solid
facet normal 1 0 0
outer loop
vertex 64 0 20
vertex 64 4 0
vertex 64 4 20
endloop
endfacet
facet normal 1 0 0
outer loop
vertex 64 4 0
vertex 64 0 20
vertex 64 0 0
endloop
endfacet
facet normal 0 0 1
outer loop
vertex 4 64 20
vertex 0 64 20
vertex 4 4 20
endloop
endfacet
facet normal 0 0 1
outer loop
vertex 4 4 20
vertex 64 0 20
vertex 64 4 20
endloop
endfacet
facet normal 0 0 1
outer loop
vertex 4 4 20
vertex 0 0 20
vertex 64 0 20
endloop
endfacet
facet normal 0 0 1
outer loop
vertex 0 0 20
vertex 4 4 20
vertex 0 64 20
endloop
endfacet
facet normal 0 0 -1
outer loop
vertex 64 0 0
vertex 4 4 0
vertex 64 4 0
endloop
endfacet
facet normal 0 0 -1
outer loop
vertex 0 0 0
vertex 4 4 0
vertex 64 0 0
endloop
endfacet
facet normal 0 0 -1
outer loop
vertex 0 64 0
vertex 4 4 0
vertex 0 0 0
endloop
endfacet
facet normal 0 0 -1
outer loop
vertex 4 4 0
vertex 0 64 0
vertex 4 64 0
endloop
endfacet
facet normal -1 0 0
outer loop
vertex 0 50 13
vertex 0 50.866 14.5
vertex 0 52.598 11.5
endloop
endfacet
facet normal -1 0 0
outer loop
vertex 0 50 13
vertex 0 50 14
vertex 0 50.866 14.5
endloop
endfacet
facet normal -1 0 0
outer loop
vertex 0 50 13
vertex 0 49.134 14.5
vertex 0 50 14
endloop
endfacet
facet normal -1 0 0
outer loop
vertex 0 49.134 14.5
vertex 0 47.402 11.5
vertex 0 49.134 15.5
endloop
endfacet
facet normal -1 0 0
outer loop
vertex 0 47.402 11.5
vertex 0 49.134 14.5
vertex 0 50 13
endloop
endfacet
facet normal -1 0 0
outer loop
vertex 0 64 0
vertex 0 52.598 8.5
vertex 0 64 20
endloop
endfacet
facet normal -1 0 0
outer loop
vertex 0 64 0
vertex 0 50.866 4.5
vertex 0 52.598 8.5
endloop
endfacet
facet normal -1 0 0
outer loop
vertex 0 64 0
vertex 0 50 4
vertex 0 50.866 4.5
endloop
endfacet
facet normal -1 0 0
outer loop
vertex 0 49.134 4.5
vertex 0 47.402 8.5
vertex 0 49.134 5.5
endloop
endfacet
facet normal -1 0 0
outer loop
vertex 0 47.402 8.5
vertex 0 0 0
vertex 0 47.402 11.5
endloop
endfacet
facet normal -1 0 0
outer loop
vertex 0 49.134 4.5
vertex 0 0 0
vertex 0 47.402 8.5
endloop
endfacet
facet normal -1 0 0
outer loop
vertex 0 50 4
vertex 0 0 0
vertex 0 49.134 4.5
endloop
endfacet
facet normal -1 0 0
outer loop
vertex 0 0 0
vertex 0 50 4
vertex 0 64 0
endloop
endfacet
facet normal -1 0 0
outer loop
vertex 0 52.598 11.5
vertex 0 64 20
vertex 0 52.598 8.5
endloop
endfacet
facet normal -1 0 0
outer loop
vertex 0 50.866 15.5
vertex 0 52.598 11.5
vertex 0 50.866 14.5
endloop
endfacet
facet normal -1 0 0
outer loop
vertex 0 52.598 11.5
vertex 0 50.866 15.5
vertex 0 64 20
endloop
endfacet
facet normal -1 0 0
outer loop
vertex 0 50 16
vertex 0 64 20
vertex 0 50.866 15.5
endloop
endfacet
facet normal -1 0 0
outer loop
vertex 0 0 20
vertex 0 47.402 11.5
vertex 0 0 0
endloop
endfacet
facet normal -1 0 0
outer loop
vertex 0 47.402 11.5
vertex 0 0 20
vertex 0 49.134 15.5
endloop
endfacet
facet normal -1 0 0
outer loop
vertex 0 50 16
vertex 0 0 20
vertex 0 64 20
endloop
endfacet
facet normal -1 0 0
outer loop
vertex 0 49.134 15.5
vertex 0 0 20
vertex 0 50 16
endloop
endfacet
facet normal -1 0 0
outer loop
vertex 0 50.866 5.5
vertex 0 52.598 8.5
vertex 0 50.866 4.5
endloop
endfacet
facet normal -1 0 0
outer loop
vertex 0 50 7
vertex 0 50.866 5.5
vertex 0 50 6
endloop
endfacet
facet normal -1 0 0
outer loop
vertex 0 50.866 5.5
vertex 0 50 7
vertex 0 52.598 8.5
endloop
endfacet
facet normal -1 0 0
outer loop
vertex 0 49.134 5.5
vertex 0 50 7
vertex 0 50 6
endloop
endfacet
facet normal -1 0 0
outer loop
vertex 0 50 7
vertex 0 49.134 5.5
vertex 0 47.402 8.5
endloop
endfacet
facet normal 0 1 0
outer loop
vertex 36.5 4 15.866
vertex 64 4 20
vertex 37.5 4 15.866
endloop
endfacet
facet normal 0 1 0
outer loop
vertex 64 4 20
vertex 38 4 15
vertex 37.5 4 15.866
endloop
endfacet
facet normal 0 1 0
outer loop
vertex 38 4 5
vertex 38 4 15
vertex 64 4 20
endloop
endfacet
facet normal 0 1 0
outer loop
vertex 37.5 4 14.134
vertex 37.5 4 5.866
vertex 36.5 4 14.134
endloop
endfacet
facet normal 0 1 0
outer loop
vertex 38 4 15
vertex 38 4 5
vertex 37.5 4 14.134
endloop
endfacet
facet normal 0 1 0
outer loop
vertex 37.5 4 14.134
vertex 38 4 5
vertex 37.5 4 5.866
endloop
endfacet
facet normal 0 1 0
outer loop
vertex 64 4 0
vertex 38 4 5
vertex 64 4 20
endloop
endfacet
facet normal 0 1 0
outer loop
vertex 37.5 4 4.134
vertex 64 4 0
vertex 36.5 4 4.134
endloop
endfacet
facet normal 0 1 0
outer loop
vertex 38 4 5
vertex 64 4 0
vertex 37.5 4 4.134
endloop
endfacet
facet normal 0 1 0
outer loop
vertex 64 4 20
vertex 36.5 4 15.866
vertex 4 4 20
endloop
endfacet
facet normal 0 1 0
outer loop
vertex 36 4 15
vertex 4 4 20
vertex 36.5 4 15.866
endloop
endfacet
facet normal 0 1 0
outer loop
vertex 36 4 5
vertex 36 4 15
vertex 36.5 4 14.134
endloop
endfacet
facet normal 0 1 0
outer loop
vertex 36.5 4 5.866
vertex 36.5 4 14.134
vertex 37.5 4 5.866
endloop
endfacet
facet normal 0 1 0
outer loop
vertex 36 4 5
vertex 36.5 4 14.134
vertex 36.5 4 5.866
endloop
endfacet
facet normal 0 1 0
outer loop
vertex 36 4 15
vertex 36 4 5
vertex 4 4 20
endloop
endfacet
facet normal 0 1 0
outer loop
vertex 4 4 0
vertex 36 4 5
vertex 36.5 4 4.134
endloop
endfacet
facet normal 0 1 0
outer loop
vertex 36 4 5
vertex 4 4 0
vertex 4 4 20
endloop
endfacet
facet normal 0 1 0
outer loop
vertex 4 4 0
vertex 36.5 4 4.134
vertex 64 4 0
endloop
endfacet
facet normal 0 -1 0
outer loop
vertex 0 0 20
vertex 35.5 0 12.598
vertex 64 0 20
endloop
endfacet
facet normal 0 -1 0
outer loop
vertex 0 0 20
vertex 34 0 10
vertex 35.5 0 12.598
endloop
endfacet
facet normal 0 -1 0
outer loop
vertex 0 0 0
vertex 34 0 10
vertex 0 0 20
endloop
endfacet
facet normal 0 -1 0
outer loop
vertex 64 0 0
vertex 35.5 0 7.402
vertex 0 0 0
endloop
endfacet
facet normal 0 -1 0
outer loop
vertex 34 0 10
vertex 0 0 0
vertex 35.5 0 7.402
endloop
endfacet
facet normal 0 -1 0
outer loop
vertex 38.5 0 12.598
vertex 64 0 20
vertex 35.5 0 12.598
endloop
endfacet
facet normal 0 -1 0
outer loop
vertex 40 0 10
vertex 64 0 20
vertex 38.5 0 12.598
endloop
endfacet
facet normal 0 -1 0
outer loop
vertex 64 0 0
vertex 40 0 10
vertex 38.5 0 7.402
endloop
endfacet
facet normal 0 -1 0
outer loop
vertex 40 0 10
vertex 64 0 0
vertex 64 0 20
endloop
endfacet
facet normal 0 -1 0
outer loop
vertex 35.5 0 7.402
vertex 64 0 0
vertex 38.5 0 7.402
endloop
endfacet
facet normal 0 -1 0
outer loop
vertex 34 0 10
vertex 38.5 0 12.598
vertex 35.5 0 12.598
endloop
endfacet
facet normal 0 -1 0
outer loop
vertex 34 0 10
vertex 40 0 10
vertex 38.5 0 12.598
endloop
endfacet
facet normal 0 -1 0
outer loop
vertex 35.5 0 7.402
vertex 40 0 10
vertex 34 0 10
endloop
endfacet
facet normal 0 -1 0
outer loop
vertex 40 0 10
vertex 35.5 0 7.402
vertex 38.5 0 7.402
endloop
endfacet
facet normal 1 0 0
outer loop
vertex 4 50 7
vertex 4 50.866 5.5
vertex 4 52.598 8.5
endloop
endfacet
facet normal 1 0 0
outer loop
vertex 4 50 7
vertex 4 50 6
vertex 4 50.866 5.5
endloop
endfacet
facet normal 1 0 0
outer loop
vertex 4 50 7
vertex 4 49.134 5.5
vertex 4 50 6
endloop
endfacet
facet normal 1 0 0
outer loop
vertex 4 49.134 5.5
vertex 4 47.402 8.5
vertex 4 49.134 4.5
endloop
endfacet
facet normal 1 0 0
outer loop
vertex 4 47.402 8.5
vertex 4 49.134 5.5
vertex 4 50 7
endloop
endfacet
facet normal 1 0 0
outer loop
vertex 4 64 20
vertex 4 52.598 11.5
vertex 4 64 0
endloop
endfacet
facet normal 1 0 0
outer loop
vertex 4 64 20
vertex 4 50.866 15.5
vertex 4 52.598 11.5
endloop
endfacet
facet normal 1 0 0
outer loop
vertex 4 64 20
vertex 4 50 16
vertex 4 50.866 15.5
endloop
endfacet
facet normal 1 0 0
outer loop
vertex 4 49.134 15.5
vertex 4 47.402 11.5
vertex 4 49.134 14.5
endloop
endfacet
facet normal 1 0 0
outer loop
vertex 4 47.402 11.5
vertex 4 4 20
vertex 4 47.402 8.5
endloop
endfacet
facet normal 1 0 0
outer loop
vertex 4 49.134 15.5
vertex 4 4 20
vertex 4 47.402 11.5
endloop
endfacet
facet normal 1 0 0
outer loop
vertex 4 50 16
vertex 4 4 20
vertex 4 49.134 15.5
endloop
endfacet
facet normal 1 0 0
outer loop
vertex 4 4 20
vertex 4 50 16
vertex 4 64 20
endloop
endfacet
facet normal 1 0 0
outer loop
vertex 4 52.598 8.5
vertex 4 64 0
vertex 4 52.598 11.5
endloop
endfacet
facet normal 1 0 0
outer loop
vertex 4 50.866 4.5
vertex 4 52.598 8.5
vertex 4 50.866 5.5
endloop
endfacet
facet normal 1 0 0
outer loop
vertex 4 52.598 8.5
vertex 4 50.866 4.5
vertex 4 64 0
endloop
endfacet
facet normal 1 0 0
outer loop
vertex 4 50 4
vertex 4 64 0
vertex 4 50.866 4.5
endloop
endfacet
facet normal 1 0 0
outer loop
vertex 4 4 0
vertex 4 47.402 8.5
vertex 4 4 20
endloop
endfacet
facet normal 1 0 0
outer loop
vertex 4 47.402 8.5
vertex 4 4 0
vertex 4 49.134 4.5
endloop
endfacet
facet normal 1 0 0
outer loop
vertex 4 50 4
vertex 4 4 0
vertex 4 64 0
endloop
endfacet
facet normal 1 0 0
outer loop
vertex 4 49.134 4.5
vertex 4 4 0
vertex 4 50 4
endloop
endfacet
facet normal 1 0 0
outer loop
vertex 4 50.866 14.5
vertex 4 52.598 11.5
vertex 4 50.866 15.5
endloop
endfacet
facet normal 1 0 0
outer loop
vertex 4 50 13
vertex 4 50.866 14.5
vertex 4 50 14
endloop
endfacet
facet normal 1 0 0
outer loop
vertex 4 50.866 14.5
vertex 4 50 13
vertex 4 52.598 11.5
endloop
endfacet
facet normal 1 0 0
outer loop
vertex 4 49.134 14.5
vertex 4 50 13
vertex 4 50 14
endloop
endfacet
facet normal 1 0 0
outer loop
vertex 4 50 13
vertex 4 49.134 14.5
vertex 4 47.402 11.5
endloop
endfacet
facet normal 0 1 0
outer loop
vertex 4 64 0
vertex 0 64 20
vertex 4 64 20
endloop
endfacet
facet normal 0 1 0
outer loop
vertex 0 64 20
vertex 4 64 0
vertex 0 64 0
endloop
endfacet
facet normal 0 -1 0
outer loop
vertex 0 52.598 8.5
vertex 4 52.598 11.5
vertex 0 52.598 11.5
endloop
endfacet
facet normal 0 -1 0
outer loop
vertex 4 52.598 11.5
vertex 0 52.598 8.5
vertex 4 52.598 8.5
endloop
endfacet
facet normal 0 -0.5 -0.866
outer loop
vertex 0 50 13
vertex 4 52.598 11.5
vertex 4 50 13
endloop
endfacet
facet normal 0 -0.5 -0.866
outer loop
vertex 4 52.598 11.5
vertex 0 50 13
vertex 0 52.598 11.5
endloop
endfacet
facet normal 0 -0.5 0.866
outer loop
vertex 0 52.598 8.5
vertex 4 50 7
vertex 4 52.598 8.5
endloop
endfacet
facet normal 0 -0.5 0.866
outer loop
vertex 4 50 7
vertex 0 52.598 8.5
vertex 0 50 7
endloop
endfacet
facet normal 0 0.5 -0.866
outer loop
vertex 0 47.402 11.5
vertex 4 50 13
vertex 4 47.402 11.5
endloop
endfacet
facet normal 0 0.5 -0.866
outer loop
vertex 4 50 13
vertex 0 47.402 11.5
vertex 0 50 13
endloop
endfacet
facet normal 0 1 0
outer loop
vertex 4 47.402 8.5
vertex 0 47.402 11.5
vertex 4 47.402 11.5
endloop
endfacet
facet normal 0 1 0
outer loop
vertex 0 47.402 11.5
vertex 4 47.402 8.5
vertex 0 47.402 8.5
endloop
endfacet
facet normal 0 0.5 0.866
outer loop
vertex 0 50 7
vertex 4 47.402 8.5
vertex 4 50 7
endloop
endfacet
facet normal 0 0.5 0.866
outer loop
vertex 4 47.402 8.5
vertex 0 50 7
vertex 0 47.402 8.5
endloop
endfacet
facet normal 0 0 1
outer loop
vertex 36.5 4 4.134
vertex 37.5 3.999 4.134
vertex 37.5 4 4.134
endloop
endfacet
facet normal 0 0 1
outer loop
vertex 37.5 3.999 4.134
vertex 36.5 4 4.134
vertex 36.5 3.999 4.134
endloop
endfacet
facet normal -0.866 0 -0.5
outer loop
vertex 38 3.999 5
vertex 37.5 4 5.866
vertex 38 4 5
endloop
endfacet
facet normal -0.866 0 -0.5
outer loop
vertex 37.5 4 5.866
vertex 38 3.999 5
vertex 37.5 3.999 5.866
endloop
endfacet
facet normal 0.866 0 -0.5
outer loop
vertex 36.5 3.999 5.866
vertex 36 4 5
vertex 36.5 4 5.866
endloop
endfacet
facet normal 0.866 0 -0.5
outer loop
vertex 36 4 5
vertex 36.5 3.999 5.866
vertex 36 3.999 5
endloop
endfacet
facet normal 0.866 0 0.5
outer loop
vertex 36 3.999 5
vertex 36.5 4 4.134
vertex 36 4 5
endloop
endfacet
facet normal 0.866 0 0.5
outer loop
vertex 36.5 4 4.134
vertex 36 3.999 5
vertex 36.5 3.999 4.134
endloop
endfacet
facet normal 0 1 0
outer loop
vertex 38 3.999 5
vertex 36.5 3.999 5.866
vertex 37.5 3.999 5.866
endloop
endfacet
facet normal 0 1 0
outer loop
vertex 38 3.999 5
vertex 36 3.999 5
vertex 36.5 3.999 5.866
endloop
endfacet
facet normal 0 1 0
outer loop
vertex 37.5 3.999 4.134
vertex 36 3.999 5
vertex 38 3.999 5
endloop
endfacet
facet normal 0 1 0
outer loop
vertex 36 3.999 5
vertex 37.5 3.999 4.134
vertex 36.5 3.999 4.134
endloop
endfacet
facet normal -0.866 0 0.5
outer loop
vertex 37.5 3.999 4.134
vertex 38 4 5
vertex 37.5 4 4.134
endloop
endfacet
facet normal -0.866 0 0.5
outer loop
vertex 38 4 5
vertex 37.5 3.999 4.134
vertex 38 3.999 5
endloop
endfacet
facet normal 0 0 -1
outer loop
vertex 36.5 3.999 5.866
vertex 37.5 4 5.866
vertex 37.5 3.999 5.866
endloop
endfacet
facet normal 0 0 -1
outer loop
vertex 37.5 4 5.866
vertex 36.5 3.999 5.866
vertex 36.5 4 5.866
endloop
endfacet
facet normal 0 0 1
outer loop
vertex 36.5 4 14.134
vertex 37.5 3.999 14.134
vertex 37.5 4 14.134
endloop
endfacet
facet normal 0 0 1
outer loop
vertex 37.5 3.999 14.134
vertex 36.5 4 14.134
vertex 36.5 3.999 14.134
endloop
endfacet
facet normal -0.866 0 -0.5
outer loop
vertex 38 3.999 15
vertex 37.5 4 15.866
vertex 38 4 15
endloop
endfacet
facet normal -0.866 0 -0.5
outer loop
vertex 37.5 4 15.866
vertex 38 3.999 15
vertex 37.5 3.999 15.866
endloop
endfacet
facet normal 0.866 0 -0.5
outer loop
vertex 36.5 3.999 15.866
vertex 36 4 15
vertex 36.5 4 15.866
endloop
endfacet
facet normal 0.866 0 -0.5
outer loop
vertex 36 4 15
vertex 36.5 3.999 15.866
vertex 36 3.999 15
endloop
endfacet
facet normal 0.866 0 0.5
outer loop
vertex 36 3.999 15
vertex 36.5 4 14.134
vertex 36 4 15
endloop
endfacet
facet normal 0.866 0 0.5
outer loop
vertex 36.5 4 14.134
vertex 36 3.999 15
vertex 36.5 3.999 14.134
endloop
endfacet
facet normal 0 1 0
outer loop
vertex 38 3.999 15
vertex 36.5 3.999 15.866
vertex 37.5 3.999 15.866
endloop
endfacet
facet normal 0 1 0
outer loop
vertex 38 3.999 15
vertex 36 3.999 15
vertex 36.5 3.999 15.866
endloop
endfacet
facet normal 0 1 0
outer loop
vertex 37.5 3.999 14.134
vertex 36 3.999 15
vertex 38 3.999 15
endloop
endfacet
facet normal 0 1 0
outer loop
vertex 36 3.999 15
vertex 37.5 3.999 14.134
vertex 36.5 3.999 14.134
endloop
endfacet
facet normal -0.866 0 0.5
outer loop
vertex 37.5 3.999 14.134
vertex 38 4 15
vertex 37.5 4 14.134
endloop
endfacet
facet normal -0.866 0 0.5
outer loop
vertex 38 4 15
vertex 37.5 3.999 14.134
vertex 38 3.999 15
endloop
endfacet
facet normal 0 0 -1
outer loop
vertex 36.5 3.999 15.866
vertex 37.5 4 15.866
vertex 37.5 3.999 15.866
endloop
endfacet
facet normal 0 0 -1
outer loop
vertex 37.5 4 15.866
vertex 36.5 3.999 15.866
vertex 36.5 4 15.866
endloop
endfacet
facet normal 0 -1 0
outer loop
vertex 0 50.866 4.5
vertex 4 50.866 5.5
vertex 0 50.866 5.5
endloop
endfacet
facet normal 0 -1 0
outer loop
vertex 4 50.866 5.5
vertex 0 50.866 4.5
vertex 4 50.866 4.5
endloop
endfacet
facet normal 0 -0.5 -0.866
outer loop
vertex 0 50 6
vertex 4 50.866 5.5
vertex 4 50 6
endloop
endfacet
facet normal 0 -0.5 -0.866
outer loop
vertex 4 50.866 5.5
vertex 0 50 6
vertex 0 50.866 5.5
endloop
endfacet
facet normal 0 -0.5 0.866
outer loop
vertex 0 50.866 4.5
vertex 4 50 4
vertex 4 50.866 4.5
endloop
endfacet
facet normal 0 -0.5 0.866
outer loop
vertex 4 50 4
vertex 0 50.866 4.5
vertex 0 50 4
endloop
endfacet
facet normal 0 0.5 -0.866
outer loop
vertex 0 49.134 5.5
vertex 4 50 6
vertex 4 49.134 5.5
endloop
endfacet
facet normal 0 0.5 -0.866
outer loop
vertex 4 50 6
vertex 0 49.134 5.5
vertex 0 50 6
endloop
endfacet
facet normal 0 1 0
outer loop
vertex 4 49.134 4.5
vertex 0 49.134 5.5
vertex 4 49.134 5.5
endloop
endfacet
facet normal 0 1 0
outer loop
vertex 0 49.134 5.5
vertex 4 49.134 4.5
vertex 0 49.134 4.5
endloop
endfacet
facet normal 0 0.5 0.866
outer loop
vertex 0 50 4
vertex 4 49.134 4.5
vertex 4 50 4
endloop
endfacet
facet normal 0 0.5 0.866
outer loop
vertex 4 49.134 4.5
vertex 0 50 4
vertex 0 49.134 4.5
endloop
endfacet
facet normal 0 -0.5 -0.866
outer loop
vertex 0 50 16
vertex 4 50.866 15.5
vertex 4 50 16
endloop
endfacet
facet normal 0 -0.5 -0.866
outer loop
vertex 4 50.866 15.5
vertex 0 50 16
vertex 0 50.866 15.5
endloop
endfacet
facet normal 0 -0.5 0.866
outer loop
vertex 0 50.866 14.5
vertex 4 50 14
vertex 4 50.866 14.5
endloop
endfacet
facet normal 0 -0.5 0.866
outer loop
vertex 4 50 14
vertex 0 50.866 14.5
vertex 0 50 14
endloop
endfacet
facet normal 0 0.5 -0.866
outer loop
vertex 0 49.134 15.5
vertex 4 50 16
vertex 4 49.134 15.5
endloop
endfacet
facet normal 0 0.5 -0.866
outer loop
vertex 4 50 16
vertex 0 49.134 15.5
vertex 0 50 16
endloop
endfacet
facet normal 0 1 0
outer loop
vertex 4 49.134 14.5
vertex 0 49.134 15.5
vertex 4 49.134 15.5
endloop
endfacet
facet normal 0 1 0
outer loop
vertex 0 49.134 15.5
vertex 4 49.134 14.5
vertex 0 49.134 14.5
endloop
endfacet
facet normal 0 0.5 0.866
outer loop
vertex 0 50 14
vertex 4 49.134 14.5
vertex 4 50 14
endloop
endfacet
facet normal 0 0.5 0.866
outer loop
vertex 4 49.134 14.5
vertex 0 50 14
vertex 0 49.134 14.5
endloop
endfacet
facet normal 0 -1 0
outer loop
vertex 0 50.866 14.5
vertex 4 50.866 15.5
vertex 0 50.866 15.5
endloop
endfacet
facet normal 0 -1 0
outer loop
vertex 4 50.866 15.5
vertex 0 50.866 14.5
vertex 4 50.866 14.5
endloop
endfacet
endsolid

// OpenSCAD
/*      :::::::::     :::     ::::    :::      ::::::::::: ::::::::::: :::    :::::::::::    
     :+:    :+:  :+: :+:   :+:+:   :+:          :+:         :+:     :+:        :+:         
    +:+    +:+ +:+   +:+  :+:+:+  +:+          +:+         +:+     +:+        +:+          
   +#++:++#+ +#++:++#++: +#+ +:+ +#+          +#+         +#+     +#+        +#+           
  +#+       +#+     +#+ +#+  +#+#+#          +#+         +#+     +#+        +#+            
 #+#       #+#     #+# #+#   #+#+#          #+#         #+#     #+#        #+#             
###       ###     ### ###    ####          ###     ########### ########## ###              
        :::   :::    ::::::::  :::::::::: ::::::::   ::::::::                              
      :+:+: :+:+:  :+:    :+: :+:       :+:    :+: :+:    :+:                              
    +:+ +:+:+ +:+ +:+    +:+ +:+       +:+    +:+ +:+                                      
   +#+  +:+  +#+ +#+    +:+ :#::+::#  +#+    +:+ +#++:++#++                                
  +#+       +#+ +#+    +#+ +#+       +#+    +#+        +#+                                 
 #+#       #+# #+#    #+# #+#       #+#    #+# #+#    #+#                                  
###       ###  ########  ###        ########   ########                                    */             

/*~*~*~*~*~*~*~*~*~*************Pan Tilt Mechanism**************~*~*~*~*~*~*~*~*~*~*~*~*/


// This pan tilt mechanism functions to maneuver the camera for the RaspberrySpy car. //


/*Description: The pan tilt mechanism consists of a tiltArm, two horns, two servo motors. The tiltArm connects to the two horns of two servo motors. The horns are permanentally connected to the motor via a screw and two screw pins. 

Assuming front view, one servo connects to the underSide of the piece and the other servo connects to the vertical topSide. Controlled by touch screen operation, the tiltArm maneuvers the camera to look up and town with vertical swipes of the screen and side to side with horizontal swipe input. 

With a top view orientation the part appears as an L shape, a flat rectangle along the x axis and a flat rectangle joined with a half circle on the y axis. Two hexagons are extruded into the piece for use for inserting the screws into the horns. Hexagons rather than circles were chosen for this purpose to prevent 45 degree rule printing complications.*/

epsilon=.001; //This small value prevents problematic rendering.

/*Creating the Arm*/

/*Set the value of the extrusionHeight and the topSide and underSide rectangles that make up the tiltArm. */
extrusionHeight=20;
extrusionMid= extrusionHeight/2; //This value used to get the hornScrewEntries in the middle.
extrusionTop= extrusionMid*0.5;
extrusionBottom=extrusionHeight-extrusionTop;
topSideHeight=64;
underSideWidth=topSideHeight;                                                                                                  
topSideWidth=4;
underSideHeight=topSideWidth;

/*Set the position of the hornScrewEntrys.*/
xHornScrewEntry=37;
yHornScrewEntry=50;

module tiltArm(){
//Join the topSide and underSide
	union(){

	/*Construct topSide*/
	cube(size=[topSideHeight,topSideWidth,extrusionHeight], center=false); //Construct topSide rectangle
	translate(topSideHeight, 0, extrusionMid)
	/*Construct underSide*/
	cube(size=[underSideHeight,underSideWidth,extrusionHeight], center=false);//Construct underSide rectangle
	}
}
//tiltArm(); 

//end of Creating the Arm

/*Constructing the hornScrewEntrys*/
module hornScrewEntry(){
	//topSide hornScrew
	translate([xHornScrewEntry,0,extrusionMid])
	rotate([90,0,0])
	cylinder(h=topSideWidth+epsilon, r=3, center=false, $fn=6);

	//underSide hornScrew
	translate([0,yHornScrewEntry,extrusionMid])
	rotate([0,90,0])
	cylinder(h=topSideWidth+epsilon, r=3, center=false, $fn=6);
}

module insertHornScrews(){
difference(){
	tiltArm(); hornScrewEntry();
	}
}

module screwPinEntry(){
	//topSide pinScrews
	translate([xHornScrewEntry,8,extrusionTop])
	rotate([90,0,0])
	cylinder(h=topSideWidth+epsilon, r=1, center=false, $fn=6); //top

	translate([xHornScrewEntry,8,extrusionBottom])
	rotate([90,0,0])
	cylinder(h=topSideWidth+epsilon, r=1, center=false, $fn=6); //bottom

	//underSide pinScrews
	translate([0,yHornScrewEntry,extrusionTop])
	rotate([0,90,0])
	cylinder(h=topSideWidth+epsilon, r=1, center=false, $fn=6); //top

	translate([0,yHornScrewEntry,extrusionBottom])
	rotate([0,90,0])
	cylinder(h=topSideWidth+epsilon, r=1, center=false, $fn=6); //bottom
}

difference(){
	insertHornScrews(); screwPinEntry();	
}
